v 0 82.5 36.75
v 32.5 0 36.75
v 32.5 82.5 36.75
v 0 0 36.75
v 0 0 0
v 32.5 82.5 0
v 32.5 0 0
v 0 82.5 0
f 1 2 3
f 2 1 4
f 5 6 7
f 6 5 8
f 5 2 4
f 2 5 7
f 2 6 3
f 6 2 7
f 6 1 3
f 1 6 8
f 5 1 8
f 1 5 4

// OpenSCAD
// all dimensions in millimeters [in]
// includes matresses and accesories

// parameters
width_outer = 32.5;
length_outer = 82.5;
height_outer = 36.75;
body_size = [
  width_outer,
  length_outer,
  height_outer
];

// rough model
module body() {
  color("DimGrey") cube(size=body_size, center=false);
}

// render
body();
